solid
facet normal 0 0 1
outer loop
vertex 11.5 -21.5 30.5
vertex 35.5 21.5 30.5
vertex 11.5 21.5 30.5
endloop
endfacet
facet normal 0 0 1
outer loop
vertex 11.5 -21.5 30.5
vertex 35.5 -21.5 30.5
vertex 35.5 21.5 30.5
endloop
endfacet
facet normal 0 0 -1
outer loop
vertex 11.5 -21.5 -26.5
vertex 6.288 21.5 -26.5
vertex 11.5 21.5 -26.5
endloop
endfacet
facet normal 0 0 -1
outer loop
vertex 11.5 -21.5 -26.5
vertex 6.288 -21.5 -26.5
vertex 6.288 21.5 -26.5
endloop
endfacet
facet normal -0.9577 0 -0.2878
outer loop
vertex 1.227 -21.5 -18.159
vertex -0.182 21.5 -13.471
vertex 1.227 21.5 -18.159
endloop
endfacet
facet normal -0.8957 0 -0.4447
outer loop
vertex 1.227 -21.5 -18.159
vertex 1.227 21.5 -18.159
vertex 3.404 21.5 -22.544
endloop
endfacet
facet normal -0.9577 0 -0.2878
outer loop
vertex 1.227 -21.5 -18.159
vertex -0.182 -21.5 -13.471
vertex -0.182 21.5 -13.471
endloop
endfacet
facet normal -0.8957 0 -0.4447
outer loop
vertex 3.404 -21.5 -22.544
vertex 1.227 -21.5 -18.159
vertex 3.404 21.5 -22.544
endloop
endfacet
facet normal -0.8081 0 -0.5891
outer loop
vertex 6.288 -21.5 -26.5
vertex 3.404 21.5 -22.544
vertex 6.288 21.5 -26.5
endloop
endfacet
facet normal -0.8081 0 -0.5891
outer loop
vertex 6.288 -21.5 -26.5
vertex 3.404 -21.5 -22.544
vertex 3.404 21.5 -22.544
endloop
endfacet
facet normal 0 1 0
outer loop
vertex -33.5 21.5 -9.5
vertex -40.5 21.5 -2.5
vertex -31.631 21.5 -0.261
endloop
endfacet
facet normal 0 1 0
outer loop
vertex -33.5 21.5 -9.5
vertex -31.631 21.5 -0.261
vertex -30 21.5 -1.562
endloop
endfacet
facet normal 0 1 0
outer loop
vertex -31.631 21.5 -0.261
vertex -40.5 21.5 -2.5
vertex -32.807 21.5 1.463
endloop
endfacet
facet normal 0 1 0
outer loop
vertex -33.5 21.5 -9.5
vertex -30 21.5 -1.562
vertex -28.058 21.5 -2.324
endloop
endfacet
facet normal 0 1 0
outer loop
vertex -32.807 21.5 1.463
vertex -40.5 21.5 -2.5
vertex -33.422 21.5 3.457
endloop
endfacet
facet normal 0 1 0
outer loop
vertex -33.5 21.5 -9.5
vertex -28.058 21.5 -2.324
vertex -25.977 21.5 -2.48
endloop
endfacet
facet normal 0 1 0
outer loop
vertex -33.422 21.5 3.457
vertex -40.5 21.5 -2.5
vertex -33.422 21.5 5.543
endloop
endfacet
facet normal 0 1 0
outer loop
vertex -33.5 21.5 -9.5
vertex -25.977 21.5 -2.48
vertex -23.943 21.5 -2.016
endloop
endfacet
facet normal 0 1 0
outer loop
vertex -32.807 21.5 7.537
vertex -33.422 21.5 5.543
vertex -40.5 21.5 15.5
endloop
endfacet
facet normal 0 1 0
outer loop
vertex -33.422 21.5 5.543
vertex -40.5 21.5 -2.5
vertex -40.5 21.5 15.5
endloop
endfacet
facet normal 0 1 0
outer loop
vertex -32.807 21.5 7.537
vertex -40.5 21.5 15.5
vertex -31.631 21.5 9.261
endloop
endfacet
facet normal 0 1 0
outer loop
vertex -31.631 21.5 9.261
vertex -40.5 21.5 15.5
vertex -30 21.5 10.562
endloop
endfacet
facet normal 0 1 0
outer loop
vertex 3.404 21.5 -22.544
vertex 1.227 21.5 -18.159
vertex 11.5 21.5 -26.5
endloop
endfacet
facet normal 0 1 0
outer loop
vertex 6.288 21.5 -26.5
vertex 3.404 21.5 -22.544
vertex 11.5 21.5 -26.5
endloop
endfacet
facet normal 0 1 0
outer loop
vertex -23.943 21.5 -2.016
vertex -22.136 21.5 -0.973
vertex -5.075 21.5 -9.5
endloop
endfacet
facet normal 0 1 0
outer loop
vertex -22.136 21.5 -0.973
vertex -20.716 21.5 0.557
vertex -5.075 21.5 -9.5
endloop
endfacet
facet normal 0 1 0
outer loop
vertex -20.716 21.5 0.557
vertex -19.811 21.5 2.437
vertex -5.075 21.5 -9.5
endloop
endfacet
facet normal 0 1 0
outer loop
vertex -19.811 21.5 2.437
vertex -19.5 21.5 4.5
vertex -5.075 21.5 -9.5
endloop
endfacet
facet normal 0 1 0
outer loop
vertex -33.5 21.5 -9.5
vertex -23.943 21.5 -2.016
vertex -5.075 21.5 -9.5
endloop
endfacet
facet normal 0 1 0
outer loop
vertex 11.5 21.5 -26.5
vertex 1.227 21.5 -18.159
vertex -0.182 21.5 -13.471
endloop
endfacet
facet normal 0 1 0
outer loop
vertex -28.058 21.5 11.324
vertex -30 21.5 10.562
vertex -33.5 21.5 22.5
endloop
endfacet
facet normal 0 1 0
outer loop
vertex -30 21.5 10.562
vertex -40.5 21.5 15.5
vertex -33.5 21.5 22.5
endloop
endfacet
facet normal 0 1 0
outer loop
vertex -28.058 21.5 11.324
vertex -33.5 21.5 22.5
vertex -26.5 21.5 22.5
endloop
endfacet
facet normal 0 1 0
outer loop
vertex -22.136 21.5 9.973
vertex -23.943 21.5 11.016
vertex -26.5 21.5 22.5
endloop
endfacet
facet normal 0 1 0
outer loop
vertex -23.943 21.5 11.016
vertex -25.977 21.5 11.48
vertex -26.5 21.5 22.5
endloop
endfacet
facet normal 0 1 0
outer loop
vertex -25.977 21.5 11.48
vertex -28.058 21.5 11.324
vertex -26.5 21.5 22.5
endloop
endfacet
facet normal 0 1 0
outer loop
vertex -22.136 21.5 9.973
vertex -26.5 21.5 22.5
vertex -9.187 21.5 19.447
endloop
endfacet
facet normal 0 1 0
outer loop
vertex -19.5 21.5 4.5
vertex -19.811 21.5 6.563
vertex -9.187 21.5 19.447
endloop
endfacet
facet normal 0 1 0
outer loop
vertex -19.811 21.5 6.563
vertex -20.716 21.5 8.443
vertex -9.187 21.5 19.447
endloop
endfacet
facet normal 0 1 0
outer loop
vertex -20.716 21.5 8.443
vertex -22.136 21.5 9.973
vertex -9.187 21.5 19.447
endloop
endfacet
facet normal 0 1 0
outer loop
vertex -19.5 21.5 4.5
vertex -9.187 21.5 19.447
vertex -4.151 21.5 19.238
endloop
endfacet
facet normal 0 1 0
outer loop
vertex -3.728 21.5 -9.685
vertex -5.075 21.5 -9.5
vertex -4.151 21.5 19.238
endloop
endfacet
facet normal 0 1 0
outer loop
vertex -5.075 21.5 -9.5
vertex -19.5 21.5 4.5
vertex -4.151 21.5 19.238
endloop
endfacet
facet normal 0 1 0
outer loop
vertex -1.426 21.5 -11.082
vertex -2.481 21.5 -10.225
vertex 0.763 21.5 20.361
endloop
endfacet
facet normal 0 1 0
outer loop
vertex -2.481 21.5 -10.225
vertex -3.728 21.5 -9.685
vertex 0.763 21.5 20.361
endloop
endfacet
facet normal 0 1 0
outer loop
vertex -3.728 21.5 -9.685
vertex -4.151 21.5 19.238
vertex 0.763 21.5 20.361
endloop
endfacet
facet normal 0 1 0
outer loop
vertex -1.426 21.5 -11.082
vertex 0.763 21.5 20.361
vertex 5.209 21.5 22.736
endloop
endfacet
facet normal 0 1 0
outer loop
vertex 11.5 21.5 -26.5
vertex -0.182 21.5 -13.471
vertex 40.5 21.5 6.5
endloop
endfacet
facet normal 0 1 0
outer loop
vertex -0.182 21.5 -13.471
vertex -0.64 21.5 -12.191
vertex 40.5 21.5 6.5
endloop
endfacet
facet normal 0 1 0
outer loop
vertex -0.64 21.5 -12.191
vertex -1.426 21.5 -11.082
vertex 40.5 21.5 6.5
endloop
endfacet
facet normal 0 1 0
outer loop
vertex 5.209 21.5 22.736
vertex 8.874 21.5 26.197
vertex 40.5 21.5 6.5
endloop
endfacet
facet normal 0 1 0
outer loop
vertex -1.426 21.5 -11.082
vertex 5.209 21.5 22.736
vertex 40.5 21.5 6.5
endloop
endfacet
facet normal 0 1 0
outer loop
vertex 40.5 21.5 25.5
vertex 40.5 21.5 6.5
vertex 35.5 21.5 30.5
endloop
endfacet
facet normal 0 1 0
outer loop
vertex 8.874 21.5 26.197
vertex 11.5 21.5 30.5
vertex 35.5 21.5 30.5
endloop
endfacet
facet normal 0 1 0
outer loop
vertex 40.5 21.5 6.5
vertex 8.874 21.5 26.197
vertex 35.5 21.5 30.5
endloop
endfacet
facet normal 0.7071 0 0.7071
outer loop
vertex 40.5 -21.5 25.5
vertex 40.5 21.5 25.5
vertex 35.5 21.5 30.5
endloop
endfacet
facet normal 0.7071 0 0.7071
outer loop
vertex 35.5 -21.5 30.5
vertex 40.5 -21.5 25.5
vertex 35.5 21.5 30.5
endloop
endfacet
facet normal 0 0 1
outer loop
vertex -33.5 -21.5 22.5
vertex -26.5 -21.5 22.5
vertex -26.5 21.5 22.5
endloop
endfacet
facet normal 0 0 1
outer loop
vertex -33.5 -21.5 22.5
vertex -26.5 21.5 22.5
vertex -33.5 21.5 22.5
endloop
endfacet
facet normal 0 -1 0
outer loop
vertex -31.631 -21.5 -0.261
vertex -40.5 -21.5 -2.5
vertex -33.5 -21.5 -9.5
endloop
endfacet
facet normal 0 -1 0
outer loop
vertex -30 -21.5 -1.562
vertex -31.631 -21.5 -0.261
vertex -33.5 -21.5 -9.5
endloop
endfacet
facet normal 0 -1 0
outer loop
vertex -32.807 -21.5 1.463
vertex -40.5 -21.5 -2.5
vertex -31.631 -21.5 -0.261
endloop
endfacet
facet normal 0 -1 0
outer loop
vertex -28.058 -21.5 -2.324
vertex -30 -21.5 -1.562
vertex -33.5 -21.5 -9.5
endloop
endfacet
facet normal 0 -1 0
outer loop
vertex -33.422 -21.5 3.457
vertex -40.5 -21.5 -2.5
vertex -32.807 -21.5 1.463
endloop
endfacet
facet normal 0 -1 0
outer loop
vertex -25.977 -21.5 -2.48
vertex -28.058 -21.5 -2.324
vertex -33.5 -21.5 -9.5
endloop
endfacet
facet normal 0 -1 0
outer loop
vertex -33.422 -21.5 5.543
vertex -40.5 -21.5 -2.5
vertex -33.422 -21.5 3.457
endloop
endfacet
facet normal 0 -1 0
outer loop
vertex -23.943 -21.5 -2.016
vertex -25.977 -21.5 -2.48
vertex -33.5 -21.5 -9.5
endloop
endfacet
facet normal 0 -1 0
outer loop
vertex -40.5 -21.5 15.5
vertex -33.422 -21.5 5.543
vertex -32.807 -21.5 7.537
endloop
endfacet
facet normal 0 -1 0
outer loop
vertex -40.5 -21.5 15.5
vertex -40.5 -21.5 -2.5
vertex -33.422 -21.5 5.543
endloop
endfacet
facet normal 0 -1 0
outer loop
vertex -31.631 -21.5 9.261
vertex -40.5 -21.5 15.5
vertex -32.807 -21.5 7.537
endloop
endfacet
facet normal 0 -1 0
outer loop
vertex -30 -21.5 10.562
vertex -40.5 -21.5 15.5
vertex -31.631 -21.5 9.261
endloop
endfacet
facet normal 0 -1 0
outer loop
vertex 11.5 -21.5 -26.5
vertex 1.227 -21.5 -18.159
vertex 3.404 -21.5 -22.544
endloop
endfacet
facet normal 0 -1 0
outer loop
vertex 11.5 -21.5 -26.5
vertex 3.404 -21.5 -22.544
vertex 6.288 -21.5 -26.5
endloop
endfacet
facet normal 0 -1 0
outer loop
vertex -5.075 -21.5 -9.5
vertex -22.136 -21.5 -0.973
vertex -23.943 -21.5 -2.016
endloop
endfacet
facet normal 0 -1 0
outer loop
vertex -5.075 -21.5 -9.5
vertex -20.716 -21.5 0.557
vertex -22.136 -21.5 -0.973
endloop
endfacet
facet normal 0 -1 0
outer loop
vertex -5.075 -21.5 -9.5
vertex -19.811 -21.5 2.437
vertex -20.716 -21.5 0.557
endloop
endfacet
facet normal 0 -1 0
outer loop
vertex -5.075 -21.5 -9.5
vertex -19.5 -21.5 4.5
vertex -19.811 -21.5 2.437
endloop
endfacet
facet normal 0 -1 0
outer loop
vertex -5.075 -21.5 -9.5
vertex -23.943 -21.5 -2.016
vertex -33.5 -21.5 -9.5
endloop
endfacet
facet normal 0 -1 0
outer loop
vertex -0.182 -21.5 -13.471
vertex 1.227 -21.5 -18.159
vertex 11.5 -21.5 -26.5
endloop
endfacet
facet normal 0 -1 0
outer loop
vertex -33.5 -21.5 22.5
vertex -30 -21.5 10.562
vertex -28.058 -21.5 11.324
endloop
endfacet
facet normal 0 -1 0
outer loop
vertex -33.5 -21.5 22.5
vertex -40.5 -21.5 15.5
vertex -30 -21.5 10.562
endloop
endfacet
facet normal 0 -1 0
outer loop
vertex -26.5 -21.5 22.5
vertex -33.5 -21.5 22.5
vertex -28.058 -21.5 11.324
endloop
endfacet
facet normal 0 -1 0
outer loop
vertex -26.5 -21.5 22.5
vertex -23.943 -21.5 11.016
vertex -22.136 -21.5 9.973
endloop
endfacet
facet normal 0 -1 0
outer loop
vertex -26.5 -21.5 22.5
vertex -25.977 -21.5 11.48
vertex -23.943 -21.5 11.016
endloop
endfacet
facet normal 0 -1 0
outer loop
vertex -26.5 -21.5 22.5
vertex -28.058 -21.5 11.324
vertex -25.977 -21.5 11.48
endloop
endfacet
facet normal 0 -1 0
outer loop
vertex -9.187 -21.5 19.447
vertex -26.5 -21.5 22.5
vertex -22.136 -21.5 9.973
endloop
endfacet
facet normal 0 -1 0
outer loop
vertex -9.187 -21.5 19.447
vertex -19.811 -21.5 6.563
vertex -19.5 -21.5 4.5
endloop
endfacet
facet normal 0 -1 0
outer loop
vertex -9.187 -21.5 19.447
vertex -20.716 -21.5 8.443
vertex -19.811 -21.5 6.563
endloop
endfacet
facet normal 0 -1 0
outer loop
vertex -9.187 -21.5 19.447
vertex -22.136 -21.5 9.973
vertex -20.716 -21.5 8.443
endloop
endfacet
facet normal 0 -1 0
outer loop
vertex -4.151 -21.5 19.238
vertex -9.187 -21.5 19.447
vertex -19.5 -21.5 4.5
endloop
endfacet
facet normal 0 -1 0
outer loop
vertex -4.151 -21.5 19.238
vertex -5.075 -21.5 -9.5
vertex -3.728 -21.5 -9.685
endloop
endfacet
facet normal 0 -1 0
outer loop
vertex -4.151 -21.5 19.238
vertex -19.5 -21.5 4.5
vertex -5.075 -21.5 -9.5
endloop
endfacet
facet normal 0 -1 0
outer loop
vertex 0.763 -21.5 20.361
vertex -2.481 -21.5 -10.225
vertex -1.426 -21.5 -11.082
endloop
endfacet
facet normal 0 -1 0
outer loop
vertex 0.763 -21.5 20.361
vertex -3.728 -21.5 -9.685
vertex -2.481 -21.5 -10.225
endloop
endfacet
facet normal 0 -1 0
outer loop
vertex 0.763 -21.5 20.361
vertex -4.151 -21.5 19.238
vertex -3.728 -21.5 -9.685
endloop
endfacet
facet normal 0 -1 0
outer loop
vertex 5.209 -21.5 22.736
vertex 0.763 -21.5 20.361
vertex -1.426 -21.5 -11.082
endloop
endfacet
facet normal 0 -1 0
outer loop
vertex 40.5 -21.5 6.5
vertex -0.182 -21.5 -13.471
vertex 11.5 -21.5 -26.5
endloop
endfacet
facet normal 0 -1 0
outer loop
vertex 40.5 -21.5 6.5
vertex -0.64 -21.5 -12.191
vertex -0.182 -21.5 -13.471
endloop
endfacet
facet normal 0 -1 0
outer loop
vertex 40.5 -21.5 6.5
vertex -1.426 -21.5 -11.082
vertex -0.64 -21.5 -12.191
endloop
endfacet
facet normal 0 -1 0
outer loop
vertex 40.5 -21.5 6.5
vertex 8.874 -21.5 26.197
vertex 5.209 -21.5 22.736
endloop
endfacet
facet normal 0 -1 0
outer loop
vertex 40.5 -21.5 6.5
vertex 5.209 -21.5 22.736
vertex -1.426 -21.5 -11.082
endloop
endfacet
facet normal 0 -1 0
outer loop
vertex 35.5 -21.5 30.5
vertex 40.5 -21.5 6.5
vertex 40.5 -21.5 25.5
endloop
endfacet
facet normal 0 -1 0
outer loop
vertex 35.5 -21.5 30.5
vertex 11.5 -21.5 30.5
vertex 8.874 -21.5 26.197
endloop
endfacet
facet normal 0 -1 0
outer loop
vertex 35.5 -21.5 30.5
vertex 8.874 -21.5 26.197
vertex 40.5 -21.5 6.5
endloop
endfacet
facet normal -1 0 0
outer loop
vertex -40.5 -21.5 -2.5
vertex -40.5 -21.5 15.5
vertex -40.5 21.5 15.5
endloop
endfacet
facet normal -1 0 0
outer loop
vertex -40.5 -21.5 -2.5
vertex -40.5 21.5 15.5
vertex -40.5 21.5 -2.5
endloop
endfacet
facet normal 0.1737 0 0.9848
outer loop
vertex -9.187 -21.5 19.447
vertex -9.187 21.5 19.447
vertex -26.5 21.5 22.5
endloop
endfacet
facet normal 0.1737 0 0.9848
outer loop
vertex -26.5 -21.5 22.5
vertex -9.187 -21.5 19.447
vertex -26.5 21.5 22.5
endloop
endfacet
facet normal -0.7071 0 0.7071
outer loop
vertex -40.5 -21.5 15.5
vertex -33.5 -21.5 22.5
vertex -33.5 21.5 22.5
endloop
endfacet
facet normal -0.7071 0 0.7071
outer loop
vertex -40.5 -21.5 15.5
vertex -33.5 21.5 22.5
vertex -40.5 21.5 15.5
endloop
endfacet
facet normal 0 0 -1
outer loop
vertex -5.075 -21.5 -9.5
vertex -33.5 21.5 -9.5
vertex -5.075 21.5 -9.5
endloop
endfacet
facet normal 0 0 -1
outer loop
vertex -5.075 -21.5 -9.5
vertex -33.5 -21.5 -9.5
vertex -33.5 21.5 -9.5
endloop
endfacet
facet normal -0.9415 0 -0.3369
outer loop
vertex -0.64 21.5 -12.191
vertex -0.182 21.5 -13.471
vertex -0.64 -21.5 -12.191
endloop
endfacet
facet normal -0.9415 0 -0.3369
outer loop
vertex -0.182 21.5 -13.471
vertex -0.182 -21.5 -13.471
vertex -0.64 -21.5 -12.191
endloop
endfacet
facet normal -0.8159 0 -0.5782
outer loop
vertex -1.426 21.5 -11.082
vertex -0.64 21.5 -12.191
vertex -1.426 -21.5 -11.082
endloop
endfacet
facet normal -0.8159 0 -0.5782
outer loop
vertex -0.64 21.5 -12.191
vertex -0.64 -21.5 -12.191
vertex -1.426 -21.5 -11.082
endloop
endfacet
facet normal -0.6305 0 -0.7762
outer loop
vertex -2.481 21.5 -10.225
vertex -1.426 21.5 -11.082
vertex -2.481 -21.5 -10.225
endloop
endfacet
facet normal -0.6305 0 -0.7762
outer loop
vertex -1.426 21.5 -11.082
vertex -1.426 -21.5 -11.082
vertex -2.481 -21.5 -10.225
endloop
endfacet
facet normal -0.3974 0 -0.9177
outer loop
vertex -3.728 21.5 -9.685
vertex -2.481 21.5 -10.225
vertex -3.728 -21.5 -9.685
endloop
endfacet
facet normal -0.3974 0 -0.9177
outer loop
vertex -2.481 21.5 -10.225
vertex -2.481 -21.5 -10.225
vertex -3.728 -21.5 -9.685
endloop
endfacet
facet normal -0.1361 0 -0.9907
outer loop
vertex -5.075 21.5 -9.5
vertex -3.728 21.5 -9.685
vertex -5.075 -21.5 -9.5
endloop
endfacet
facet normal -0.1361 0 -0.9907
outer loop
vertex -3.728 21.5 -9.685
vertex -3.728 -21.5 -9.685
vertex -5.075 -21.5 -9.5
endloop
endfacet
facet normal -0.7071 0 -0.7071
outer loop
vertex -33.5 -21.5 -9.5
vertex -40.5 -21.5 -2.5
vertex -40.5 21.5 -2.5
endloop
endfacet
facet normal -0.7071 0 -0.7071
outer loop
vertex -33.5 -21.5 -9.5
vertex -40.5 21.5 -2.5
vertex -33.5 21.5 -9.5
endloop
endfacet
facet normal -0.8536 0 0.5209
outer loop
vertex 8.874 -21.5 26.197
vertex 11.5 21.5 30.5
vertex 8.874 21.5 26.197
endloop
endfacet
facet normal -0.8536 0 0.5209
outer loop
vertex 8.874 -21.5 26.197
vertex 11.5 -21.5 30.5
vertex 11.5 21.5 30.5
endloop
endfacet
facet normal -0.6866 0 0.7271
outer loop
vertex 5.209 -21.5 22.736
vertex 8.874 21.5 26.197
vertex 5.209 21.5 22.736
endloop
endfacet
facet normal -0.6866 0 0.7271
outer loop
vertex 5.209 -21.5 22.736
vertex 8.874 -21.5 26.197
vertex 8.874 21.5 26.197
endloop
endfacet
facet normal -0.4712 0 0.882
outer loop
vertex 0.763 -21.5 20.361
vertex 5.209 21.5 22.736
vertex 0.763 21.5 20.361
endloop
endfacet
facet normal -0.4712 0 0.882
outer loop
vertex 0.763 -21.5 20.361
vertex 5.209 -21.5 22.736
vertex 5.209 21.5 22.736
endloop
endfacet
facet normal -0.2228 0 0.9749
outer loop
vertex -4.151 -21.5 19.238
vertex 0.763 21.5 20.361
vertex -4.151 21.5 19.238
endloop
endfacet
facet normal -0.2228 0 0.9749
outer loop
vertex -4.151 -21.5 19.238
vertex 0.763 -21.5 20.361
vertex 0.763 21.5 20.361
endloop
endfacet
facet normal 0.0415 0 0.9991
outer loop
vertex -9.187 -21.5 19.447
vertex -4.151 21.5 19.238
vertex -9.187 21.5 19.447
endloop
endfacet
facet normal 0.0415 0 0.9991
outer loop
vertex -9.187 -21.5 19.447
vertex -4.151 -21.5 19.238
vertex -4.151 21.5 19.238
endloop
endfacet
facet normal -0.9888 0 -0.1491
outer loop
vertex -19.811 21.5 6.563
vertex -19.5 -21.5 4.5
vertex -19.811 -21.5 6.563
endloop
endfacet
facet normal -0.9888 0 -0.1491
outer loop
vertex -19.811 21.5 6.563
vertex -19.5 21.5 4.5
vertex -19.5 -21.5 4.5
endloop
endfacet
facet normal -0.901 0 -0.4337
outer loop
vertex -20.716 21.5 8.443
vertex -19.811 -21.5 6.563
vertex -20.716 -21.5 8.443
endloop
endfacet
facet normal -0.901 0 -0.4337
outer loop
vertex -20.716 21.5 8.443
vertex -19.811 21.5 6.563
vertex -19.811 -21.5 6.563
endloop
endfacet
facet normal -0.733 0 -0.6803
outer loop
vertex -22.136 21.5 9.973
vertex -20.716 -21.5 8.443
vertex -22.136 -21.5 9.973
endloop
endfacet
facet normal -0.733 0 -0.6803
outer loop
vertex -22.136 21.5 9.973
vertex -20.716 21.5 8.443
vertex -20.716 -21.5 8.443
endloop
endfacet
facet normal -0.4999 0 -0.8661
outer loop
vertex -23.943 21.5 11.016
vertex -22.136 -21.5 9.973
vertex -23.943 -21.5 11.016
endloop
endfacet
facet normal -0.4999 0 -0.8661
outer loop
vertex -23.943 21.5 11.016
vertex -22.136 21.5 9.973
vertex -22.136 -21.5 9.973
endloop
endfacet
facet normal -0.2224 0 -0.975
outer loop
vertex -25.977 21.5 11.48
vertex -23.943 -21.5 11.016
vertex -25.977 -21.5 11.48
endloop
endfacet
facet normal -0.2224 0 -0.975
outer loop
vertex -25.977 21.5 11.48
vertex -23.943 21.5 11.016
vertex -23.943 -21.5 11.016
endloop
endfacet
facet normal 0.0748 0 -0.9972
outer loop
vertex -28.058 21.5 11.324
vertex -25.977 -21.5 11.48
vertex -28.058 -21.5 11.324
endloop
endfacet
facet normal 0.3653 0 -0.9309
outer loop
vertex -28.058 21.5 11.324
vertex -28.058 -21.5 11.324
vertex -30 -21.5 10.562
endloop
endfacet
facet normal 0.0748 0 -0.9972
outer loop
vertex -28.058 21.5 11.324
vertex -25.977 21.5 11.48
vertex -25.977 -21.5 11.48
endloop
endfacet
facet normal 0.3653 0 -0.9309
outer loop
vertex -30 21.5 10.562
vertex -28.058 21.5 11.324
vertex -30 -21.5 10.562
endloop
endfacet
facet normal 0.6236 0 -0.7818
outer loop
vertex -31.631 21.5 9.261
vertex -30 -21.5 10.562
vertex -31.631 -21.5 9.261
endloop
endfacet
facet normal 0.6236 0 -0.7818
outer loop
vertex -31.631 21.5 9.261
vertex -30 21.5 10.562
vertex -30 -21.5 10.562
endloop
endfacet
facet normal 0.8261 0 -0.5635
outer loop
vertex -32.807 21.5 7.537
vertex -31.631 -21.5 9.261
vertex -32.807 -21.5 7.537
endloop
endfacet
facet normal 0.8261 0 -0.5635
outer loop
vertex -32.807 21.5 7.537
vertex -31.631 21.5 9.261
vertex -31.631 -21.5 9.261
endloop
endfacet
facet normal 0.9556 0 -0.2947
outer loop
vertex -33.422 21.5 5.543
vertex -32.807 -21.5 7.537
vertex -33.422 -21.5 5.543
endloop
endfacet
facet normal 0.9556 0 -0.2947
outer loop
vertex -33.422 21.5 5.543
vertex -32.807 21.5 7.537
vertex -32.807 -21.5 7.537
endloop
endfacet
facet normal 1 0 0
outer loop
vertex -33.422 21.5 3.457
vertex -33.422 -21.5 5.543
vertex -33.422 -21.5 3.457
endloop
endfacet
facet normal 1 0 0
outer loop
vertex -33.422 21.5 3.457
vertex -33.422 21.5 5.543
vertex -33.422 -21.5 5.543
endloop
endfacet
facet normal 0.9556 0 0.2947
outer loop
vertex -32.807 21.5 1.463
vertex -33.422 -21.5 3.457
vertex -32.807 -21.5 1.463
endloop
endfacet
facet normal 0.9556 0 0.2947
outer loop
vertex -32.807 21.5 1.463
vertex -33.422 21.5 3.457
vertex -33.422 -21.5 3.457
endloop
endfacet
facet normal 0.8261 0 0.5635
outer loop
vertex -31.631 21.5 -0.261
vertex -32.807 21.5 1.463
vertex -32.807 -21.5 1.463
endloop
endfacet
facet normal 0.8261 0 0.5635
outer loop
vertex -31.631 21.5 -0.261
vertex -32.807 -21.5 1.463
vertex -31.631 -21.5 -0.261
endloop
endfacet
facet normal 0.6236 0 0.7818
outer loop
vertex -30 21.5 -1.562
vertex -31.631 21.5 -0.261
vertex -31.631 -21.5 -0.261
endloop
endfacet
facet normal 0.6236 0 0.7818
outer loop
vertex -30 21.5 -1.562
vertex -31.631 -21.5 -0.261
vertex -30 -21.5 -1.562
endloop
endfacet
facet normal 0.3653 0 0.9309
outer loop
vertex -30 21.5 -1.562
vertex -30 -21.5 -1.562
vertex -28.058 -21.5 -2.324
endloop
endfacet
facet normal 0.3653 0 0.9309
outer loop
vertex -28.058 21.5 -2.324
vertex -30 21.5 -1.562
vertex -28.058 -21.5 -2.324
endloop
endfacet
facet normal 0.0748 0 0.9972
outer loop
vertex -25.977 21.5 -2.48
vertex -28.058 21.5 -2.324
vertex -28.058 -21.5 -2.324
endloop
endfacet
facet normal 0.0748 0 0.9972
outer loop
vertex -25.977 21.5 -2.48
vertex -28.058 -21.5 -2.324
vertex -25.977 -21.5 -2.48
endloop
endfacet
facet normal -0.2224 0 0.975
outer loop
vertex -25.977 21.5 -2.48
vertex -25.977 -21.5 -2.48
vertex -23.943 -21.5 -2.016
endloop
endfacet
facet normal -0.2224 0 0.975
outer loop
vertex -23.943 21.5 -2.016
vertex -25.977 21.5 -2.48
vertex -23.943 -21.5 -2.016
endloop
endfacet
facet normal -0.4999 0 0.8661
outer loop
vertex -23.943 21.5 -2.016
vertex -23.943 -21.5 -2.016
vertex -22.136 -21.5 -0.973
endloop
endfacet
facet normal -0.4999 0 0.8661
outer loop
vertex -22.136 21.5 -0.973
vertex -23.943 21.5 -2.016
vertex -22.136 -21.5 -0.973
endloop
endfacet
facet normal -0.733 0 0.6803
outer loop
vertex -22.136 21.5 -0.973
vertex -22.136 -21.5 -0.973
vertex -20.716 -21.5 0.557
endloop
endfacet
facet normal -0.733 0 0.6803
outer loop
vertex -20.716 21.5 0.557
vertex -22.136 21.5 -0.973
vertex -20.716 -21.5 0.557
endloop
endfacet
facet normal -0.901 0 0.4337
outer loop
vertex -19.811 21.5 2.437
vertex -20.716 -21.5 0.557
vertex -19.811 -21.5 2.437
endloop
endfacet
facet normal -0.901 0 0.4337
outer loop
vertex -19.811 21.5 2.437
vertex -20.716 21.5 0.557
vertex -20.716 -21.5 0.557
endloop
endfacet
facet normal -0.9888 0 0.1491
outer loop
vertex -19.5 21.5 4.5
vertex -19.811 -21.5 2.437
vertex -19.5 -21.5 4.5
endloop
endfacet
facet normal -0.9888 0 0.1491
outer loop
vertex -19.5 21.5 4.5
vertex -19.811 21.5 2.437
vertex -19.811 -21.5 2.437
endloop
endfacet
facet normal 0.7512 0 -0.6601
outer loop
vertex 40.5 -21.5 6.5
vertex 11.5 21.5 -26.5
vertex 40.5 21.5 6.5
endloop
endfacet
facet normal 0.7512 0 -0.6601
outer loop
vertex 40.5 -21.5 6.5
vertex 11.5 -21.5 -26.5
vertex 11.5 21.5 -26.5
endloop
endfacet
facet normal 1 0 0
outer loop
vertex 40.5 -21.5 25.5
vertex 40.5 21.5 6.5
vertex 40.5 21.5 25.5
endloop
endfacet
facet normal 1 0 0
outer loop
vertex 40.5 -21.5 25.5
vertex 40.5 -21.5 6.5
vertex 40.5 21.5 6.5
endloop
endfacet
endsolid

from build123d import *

# Parameters (mm, degrees)
F0_R     = 7
F1_DEPTH = 21.5
F2_R     = 5


with BuildPart() as f1:
    # F0 (on Front) → F1 (new body, symmetric)
    with BuildSketch(Plane.XZ):
        with BuildLine():
            Line((-9.187381455, 19.4473182438), (-26.5, 22.5))
            Line((-26.5, 22.5), (-33.5, 22.5))
            Line((-33.5, 22.5), (-40.5, 15.5))
            Line((-40.5, 15.5), (-40.5, -2.5))
            Line((-40.5, -2.5), (-33.5, -9.5))
            Line((-33.5, -9.5), (-0.733982586, -9.5))
            ThreePointArc((-0.733982586, -9.5), (1.3935612661, -18.5714631594), (6.2880673968, -26.5))
            Line((6.2880673968, -26.5), (11.5, -26.5))
            Line((11.5, -26.5), (40.5, 6.5))
            Line((40.5, 6.5), (40.5, 25.5))
            Line((40.5, 25.5), (35.5, 30.5))
            Line((35.5, 30.5), (11.5, 30.5))
            ThreePointArc((11.5, 30.5), (3.0653504529, 21.400493443), (-9.187381455, 19.4473182438))
        make_face()
        with Locations((-26.5, 4.5)):
            Circle(F0_R, mode=Mode.SUBTRACT)
    extrude(amount=F1_DEPTH, both=True)

    # F2
    f2_edges = [f1.edges().sort_by_distance(p)[0] for p in [
        (-0.733983, 0, -9.5),
    ]]
    fillet(f2_edges, radius=F2_R)


solid = f1.part
